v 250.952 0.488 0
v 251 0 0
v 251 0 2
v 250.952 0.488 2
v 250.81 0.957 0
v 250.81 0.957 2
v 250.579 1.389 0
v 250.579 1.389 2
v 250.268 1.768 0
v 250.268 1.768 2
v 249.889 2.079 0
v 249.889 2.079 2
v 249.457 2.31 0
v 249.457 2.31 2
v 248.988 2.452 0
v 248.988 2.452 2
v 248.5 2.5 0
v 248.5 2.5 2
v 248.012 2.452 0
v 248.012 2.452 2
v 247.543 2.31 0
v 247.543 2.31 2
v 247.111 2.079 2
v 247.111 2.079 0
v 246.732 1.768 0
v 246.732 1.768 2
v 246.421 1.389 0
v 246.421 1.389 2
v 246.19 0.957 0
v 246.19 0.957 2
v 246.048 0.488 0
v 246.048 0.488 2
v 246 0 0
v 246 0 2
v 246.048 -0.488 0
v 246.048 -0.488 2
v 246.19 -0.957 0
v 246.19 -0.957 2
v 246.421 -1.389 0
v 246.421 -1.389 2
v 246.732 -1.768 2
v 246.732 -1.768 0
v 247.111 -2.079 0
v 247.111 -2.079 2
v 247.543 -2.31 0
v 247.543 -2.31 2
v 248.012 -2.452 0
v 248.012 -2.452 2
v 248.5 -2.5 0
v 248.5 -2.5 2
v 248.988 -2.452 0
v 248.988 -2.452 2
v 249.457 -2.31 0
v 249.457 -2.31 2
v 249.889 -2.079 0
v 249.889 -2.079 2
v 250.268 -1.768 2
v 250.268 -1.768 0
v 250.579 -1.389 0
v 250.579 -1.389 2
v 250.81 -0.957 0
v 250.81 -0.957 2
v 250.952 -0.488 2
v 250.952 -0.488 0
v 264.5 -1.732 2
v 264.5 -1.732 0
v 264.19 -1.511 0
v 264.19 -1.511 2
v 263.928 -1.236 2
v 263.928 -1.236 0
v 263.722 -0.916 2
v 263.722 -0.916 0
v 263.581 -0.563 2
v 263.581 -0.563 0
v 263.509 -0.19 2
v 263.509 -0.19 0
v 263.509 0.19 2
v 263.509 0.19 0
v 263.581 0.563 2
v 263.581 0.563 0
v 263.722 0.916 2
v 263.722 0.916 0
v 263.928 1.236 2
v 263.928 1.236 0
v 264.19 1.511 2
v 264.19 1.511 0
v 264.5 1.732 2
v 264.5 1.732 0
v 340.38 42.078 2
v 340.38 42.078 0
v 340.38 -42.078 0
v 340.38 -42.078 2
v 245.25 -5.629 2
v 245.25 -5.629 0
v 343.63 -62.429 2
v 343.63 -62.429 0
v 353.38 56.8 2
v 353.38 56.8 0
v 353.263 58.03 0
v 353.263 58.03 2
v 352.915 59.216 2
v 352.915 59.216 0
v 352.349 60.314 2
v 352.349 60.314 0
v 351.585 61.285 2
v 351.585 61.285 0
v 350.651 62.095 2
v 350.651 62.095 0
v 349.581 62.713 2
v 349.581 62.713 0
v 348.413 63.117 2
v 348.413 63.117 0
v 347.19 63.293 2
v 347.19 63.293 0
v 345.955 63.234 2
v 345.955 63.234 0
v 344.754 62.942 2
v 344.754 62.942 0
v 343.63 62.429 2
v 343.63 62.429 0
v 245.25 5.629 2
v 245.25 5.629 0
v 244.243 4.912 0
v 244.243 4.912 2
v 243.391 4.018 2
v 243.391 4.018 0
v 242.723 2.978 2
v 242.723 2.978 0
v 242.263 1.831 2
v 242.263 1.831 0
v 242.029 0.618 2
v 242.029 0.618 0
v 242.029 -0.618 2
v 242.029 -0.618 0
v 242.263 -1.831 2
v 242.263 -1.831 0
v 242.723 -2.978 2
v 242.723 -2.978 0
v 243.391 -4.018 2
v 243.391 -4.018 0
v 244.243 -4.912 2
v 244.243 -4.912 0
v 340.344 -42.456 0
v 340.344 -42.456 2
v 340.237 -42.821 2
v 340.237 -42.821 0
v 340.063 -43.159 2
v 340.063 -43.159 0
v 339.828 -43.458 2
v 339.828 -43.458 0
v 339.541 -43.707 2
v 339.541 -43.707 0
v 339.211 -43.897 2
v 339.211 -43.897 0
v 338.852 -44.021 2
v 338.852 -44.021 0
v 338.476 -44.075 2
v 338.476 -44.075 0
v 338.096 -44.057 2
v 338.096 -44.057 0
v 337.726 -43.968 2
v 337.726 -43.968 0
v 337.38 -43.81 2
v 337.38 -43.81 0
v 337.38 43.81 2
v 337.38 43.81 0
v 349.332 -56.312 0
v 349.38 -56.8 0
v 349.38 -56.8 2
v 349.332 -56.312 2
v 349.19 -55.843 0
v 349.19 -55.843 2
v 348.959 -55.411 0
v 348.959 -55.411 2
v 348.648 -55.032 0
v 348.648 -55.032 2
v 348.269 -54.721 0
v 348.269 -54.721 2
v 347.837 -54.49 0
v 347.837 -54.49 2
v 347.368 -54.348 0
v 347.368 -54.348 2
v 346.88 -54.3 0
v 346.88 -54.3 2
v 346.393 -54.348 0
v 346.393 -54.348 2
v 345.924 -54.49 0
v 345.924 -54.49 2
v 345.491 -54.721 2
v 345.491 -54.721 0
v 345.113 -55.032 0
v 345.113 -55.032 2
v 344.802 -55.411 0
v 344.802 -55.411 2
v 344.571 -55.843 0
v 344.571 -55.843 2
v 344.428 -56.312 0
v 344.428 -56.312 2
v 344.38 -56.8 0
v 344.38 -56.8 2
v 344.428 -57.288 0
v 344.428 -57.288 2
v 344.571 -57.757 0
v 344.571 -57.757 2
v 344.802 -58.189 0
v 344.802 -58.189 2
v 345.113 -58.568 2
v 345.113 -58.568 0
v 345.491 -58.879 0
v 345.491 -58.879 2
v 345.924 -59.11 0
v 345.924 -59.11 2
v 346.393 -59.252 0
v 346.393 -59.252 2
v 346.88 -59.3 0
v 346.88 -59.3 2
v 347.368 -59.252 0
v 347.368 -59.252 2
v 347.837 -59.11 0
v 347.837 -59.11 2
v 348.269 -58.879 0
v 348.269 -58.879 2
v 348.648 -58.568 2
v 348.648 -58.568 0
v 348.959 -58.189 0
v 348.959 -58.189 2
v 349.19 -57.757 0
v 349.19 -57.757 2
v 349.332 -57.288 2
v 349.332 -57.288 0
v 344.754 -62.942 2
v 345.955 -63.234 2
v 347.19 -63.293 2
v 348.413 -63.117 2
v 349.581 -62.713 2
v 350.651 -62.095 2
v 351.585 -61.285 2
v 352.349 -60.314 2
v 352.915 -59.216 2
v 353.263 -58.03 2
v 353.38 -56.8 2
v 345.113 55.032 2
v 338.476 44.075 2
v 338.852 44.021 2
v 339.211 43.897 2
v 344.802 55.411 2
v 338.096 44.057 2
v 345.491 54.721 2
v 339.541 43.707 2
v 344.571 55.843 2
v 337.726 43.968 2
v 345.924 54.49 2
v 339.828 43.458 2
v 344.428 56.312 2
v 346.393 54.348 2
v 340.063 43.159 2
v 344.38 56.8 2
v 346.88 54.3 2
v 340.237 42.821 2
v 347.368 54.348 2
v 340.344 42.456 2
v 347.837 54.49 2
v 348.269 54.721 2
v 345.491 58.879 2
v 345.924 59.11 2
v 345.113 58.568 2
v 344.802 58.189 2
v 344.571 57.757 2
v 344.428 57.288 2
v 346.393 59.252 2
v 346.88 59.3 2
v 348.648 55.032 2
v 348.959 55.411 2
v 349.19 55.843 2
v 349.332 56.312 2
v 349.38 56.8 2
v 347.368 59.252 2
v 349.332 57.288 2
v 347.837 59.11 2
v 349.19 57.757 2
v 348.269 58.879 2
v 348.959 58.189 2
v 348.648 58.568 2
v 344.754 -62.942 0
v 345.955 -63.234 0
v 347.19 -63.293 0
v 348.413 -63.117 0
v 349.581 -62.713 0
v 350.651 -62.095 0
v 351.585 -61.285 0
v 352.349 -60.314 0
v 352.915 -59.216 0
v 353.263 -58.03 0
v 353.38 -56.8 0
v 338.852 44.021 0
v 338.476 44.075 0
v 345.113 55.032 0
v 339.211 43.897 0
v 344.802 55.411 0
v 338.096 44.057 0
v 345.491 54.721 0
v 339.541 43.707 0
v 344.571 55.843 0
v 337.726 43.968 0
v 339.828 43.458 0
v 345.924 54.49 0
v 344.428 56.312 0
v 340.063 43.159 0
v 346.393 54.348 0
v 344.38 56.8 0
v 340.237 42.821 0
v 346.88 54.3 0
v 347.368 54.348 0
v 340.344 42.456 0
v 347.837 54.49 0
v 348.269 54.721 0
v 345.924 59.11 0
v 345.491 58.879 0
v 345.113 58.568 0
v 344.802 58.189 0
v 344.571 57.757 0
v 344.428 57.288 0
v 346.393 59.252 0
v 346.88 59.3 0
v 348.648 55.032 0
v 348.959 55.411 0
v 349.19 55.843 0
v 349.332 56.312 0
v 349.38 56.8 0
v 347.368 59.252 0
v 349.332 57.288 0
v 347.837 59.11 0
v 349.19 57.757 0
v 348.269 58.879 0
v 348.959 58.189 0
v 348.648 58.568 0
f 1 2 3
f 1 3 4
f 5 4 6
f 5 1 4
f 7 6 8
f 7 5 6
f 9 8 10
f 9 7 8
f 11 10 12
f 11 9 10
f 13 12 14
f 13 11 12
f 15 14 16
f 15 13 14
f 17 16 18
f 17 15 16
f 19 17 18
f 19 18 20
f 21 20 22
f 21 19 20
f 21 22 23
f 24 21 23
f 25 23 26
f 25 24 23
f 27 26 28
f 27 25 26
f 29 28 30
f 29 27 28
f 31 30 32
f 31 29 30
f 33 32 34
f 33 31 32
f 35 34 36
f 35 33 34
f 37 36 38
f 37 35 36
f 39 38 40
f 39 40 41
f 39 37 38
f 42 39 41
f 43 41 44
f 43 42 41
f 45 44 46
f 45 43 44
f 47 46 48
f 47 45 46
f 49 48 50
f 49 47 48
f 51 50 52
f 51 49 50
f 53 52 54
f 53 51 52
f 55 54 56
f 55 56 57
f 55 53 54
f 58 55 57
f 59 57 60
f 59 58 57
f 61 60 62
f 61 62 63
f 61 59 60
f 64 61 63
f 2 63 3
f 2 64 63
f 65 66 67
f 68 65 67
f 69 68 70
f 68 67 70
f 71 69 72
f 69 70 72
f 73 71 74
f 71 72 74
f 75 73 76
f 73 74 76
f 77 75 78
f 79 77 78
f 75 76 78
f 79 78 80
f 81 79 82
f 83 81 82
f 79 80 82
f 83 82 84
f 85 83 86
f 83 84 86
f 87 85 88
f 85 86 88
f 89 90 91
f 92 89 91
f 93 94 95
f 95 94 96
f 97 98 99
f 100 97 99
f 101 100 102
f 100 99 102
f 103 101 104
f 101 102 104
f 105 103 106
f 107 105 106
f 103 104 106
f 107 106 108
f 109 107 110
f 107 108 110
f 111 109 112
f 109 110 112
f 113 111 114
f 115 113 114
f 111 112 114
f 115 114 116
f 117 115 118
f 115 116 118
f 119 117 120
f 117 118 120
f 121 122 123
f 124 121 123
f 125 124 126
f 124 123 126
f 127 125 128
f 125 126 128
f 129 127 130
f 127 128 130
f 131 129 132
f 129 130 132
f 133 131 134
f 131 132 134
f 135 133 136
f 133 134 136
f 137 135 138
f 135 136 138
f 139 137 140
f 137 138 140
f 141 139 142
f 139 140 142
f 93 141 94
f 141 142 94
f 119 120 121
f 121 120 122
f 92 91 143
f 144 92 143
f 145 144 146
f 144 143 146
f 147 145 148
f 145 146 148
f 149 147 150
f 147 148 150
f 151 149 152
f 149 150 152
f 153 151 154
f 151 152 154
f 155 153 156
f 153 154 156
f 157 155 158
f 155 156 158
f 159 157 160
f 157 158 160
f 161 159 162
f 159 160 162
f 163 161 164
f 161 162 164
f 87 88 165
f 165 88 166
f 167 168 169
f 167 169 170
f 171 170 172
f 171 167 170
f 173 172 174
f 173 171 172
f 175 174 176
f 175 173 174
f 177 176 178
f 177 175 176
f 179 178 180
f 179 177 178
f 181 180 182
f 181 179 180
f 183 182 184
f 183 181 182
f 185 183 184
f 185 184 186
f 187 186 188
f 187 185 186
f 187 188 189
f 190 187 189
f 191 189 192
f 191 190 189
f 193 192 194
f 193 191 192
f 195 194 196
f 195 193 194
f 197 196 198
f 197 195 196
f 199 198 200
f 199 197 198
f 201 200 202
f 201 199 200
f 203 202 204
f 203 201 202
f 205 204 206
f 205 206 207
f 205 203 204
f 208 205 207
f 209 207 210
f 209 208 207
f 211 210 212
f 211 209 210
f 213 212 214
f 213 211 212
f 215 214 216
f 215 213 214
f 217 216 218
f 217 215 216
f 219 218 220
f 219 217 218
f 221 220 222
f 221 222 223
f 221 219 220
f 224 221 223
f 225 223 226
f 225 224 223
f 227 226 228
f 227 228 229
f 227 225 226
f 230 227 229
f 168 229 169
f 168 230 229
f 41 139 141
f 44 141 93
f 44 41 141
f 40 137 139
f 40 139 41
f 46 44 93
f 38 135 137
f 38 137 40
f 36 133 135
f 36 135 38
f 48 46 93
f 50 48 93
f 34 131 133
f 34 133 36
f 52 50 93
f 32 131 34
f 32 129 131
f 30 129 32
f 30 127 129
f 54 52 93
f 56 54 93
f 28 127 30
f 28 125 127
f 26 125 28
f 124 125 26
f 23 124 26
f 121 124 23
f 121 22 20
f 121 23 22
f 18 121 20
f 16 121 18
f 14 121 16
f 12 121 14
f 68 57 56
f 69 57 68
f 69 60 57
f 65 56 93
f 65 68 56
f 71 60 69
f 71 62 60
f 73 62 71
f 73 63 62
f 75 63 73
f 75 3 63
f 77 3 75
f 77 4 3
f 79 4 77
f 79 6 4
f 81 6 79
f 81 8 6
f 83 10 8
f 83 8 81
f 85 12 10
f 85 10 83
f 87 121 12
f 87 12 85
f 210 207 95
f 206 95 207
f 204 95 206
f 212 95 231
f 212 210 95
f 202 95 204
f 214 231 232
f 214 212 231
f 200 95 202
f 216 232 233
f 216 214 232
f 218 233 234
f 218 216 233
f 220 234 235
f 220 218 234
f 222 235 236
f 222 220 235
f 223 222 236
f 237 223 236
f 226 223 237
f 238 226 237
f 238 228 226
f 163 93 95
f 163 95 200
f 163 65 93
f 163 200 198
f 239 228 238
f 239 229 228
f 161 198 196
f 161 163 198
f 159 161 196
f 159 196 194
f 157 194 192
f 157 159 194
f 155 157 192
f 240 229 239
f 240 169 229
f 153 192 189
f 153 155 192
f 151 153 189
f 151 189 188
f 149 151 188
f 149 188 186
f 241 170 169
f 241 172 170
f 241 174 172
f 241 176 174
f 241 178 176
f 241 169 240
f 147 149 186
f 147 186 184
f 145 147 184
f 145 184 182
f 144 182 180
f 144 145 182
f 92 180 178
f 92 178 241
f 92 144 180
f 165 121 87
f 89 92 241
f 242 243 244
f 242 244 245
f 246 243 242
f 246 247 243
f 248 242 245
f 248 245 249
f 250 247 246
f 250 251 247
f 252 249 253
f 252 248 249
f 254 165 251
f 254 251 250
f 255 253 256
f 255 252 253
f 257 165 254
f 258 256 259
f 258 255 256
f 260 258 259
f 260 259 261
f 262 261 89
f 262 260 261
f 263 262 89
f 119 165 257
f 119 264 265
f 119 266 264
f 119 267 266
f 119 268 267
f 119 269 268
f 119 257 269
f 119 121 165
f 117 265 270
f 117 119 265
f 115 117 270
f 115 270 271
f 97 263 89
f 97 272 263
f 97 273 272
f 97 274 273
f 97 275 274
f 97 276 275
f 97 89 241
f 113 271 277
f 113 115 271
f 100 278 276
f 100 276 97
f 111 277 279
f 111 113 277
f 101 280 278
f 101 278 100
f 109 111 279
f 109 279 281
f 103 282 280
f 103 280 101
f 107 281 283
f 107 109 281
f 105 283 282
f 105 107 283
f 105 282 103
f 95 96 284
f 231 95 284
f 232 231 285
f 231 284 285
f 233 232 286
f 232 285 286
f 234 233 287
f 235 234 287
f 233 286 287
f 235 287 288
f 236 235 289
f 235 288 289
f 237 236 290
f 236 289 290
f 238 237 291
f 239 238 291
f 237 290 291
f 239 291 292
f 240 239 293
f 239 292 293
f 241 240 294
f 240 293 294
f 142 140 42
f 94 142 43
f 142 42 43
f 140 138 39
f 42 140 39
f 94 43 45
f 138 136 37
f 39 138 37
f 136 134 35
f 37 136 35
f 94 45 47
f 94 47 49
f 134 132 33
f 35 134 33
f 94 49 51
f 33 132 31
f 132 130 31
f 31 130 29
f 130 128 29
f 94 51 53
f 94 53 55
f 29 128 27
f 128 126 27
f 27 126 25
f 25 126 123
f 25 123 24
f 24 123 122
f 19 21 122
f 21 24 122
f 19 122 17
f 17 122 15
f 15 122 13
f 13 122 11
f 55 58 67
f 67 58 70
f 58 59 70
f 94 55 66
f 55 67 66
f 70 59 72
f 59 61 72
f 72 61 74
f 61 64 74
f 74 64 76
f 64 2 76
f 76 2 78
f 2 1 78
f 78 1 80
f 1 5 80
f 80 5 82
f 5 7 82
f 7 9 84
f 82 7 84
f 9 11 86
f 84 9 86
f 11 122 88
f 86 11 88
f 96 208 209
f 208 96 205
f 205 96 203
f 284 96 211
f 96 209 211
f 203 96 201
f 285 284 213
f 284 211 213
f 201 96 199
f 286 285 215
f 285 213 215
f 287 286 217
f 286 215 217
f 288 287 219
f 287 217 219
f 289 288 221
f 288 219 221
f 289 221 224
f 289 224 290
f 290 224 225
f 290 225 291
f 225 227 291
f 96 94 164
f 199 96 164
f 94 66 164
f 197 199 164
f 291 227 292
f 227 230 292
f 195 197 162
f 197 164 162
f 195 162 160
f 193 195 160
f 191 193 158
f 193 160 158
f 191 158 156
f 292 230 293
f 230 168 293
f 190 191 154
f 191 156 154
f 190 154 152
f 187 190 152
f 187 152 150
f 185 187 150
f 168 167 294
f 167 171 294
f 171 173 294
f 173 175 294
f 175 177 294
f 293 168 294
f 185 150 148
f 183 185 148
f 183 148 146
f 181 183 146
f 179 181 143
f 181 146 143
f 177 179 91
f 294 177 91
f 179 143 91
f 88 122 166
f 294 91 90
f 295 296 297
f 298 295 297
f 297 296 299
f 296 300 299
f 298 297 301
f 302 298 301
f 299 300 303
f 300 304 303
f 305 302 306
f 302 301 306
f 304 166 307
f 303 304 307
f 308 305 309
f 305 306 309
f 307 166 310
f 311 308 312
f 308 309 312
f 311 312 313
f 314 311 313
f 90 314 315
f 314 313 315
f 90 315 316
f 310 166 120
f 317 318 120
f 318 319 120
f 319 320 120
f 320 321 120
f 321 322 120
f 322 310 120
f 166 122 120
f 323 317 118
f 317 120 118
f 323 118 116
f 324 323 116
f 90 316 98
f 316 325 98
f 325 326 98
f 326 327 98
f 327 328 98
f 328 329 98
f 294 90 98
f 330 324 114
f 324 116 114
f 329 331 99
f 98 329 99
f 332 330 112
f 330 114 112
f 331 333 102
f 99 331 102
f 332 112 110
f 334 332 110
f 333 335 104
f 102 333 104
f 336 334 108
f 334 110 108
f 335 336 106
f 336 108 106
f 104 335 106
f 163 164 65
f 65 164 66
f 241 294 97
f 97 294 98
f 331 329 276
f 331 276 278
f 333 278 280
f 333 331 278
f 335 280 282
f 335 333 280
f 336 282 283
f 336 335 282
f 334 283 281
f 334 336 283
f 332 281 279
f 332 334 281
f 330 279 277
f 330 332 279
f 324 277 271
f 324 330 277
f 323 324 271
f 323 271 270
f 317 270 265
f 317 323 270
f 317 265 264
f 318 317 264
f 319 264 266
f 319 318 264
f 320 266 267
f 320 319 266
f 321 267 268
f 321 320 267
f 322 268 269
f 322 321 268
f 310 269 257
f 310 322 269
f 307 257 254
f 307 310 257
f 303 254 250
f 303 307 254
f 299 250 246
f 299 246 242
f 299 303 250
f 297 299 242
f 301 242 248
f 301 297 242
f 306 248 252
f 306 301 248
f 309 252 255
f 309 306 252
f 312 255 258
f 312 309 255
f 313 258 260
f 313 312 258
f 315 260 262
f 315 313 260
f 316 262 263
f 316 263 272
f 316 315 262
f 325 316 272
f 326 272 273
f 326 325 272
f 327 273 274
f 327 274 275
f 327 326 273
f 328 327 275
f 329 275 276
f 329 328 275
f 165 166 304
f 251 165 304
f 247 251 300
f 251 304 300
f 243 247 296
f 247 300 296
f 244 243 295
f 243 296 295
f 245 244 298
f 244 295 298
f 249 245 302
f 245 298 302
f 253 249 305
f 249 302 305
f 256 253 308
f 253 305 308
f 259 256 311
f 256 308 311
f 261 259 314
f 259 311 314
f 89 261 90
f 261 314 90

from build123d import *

# Parameters (mm, degrees)
SKETCH1_R           = 2.5
BOSS_EXTRUDE1_DEPTH = 2


with BuildPart() as part:
    # Sketch1 → Boss-Extrude1 (new body)
    with BuildSketch(Plane.XY):
        with BuildLine():
            Line((245.25, -5.629165125), (343.630404909, -62.429118382))
            ThreePointArc((343.630404909, -62.429118382), (350.130404909, -62.429118382), (353.380404909, -56.799953257))
            Line((353.380404909, -56.799953257), (353.380404909, 56.799953257))
            ThreePointArc((353.380404909, 56.799953257), (350.130404909, 62.429118382), (343.630404909, 62.429118382))
            Line((343.630404909, 62.429118382), (245.25, 5.629165125))
            ThreePointArc((245.25, 5.629165125), (242, 0), (245.25, -5.629165125))
        make_face()
        with Locations((248.5, 0)):
            Circle(SKETCH1_R, mode=Mode.SUBTRACT)
        with Locations((346.880404909, -56.799953257)):
            Circle(SKETCH1_R, mode=Mode.SUBTRACT)
        with Locations((346.880404909, 56.799953257)):
            Circle(SKETCH1_R, mode=Mode.SUBTRACT)
        with BuildLine():
            Line((264.5, 1.732050808), (337.380404909, 43.809572201))
            ThreePointArc((337.380404909, 43.809572201), (339.380404909, 43.809572201), (340.380404909, 42.077521393))
            Line((340.380404909, 42.077521393), (340.380404909, -42.077521393))
            ThreePointArc((340.380404909, -42.077521393), (339.380404909, -43.809572201), (337.380404909, -43.809572201))
            Line((337.380404909, -43.809572201), (264.5, -1.732050808))
            ThreePointArc((264.5, -1.732050808), (263.5, 0), (264.5, 1.732050808))
        make_face(mode=Mode.SUBTRACT)
    extrude(amount=BOSS_EXTRUDE1_DEPTH)


solid = part.part
